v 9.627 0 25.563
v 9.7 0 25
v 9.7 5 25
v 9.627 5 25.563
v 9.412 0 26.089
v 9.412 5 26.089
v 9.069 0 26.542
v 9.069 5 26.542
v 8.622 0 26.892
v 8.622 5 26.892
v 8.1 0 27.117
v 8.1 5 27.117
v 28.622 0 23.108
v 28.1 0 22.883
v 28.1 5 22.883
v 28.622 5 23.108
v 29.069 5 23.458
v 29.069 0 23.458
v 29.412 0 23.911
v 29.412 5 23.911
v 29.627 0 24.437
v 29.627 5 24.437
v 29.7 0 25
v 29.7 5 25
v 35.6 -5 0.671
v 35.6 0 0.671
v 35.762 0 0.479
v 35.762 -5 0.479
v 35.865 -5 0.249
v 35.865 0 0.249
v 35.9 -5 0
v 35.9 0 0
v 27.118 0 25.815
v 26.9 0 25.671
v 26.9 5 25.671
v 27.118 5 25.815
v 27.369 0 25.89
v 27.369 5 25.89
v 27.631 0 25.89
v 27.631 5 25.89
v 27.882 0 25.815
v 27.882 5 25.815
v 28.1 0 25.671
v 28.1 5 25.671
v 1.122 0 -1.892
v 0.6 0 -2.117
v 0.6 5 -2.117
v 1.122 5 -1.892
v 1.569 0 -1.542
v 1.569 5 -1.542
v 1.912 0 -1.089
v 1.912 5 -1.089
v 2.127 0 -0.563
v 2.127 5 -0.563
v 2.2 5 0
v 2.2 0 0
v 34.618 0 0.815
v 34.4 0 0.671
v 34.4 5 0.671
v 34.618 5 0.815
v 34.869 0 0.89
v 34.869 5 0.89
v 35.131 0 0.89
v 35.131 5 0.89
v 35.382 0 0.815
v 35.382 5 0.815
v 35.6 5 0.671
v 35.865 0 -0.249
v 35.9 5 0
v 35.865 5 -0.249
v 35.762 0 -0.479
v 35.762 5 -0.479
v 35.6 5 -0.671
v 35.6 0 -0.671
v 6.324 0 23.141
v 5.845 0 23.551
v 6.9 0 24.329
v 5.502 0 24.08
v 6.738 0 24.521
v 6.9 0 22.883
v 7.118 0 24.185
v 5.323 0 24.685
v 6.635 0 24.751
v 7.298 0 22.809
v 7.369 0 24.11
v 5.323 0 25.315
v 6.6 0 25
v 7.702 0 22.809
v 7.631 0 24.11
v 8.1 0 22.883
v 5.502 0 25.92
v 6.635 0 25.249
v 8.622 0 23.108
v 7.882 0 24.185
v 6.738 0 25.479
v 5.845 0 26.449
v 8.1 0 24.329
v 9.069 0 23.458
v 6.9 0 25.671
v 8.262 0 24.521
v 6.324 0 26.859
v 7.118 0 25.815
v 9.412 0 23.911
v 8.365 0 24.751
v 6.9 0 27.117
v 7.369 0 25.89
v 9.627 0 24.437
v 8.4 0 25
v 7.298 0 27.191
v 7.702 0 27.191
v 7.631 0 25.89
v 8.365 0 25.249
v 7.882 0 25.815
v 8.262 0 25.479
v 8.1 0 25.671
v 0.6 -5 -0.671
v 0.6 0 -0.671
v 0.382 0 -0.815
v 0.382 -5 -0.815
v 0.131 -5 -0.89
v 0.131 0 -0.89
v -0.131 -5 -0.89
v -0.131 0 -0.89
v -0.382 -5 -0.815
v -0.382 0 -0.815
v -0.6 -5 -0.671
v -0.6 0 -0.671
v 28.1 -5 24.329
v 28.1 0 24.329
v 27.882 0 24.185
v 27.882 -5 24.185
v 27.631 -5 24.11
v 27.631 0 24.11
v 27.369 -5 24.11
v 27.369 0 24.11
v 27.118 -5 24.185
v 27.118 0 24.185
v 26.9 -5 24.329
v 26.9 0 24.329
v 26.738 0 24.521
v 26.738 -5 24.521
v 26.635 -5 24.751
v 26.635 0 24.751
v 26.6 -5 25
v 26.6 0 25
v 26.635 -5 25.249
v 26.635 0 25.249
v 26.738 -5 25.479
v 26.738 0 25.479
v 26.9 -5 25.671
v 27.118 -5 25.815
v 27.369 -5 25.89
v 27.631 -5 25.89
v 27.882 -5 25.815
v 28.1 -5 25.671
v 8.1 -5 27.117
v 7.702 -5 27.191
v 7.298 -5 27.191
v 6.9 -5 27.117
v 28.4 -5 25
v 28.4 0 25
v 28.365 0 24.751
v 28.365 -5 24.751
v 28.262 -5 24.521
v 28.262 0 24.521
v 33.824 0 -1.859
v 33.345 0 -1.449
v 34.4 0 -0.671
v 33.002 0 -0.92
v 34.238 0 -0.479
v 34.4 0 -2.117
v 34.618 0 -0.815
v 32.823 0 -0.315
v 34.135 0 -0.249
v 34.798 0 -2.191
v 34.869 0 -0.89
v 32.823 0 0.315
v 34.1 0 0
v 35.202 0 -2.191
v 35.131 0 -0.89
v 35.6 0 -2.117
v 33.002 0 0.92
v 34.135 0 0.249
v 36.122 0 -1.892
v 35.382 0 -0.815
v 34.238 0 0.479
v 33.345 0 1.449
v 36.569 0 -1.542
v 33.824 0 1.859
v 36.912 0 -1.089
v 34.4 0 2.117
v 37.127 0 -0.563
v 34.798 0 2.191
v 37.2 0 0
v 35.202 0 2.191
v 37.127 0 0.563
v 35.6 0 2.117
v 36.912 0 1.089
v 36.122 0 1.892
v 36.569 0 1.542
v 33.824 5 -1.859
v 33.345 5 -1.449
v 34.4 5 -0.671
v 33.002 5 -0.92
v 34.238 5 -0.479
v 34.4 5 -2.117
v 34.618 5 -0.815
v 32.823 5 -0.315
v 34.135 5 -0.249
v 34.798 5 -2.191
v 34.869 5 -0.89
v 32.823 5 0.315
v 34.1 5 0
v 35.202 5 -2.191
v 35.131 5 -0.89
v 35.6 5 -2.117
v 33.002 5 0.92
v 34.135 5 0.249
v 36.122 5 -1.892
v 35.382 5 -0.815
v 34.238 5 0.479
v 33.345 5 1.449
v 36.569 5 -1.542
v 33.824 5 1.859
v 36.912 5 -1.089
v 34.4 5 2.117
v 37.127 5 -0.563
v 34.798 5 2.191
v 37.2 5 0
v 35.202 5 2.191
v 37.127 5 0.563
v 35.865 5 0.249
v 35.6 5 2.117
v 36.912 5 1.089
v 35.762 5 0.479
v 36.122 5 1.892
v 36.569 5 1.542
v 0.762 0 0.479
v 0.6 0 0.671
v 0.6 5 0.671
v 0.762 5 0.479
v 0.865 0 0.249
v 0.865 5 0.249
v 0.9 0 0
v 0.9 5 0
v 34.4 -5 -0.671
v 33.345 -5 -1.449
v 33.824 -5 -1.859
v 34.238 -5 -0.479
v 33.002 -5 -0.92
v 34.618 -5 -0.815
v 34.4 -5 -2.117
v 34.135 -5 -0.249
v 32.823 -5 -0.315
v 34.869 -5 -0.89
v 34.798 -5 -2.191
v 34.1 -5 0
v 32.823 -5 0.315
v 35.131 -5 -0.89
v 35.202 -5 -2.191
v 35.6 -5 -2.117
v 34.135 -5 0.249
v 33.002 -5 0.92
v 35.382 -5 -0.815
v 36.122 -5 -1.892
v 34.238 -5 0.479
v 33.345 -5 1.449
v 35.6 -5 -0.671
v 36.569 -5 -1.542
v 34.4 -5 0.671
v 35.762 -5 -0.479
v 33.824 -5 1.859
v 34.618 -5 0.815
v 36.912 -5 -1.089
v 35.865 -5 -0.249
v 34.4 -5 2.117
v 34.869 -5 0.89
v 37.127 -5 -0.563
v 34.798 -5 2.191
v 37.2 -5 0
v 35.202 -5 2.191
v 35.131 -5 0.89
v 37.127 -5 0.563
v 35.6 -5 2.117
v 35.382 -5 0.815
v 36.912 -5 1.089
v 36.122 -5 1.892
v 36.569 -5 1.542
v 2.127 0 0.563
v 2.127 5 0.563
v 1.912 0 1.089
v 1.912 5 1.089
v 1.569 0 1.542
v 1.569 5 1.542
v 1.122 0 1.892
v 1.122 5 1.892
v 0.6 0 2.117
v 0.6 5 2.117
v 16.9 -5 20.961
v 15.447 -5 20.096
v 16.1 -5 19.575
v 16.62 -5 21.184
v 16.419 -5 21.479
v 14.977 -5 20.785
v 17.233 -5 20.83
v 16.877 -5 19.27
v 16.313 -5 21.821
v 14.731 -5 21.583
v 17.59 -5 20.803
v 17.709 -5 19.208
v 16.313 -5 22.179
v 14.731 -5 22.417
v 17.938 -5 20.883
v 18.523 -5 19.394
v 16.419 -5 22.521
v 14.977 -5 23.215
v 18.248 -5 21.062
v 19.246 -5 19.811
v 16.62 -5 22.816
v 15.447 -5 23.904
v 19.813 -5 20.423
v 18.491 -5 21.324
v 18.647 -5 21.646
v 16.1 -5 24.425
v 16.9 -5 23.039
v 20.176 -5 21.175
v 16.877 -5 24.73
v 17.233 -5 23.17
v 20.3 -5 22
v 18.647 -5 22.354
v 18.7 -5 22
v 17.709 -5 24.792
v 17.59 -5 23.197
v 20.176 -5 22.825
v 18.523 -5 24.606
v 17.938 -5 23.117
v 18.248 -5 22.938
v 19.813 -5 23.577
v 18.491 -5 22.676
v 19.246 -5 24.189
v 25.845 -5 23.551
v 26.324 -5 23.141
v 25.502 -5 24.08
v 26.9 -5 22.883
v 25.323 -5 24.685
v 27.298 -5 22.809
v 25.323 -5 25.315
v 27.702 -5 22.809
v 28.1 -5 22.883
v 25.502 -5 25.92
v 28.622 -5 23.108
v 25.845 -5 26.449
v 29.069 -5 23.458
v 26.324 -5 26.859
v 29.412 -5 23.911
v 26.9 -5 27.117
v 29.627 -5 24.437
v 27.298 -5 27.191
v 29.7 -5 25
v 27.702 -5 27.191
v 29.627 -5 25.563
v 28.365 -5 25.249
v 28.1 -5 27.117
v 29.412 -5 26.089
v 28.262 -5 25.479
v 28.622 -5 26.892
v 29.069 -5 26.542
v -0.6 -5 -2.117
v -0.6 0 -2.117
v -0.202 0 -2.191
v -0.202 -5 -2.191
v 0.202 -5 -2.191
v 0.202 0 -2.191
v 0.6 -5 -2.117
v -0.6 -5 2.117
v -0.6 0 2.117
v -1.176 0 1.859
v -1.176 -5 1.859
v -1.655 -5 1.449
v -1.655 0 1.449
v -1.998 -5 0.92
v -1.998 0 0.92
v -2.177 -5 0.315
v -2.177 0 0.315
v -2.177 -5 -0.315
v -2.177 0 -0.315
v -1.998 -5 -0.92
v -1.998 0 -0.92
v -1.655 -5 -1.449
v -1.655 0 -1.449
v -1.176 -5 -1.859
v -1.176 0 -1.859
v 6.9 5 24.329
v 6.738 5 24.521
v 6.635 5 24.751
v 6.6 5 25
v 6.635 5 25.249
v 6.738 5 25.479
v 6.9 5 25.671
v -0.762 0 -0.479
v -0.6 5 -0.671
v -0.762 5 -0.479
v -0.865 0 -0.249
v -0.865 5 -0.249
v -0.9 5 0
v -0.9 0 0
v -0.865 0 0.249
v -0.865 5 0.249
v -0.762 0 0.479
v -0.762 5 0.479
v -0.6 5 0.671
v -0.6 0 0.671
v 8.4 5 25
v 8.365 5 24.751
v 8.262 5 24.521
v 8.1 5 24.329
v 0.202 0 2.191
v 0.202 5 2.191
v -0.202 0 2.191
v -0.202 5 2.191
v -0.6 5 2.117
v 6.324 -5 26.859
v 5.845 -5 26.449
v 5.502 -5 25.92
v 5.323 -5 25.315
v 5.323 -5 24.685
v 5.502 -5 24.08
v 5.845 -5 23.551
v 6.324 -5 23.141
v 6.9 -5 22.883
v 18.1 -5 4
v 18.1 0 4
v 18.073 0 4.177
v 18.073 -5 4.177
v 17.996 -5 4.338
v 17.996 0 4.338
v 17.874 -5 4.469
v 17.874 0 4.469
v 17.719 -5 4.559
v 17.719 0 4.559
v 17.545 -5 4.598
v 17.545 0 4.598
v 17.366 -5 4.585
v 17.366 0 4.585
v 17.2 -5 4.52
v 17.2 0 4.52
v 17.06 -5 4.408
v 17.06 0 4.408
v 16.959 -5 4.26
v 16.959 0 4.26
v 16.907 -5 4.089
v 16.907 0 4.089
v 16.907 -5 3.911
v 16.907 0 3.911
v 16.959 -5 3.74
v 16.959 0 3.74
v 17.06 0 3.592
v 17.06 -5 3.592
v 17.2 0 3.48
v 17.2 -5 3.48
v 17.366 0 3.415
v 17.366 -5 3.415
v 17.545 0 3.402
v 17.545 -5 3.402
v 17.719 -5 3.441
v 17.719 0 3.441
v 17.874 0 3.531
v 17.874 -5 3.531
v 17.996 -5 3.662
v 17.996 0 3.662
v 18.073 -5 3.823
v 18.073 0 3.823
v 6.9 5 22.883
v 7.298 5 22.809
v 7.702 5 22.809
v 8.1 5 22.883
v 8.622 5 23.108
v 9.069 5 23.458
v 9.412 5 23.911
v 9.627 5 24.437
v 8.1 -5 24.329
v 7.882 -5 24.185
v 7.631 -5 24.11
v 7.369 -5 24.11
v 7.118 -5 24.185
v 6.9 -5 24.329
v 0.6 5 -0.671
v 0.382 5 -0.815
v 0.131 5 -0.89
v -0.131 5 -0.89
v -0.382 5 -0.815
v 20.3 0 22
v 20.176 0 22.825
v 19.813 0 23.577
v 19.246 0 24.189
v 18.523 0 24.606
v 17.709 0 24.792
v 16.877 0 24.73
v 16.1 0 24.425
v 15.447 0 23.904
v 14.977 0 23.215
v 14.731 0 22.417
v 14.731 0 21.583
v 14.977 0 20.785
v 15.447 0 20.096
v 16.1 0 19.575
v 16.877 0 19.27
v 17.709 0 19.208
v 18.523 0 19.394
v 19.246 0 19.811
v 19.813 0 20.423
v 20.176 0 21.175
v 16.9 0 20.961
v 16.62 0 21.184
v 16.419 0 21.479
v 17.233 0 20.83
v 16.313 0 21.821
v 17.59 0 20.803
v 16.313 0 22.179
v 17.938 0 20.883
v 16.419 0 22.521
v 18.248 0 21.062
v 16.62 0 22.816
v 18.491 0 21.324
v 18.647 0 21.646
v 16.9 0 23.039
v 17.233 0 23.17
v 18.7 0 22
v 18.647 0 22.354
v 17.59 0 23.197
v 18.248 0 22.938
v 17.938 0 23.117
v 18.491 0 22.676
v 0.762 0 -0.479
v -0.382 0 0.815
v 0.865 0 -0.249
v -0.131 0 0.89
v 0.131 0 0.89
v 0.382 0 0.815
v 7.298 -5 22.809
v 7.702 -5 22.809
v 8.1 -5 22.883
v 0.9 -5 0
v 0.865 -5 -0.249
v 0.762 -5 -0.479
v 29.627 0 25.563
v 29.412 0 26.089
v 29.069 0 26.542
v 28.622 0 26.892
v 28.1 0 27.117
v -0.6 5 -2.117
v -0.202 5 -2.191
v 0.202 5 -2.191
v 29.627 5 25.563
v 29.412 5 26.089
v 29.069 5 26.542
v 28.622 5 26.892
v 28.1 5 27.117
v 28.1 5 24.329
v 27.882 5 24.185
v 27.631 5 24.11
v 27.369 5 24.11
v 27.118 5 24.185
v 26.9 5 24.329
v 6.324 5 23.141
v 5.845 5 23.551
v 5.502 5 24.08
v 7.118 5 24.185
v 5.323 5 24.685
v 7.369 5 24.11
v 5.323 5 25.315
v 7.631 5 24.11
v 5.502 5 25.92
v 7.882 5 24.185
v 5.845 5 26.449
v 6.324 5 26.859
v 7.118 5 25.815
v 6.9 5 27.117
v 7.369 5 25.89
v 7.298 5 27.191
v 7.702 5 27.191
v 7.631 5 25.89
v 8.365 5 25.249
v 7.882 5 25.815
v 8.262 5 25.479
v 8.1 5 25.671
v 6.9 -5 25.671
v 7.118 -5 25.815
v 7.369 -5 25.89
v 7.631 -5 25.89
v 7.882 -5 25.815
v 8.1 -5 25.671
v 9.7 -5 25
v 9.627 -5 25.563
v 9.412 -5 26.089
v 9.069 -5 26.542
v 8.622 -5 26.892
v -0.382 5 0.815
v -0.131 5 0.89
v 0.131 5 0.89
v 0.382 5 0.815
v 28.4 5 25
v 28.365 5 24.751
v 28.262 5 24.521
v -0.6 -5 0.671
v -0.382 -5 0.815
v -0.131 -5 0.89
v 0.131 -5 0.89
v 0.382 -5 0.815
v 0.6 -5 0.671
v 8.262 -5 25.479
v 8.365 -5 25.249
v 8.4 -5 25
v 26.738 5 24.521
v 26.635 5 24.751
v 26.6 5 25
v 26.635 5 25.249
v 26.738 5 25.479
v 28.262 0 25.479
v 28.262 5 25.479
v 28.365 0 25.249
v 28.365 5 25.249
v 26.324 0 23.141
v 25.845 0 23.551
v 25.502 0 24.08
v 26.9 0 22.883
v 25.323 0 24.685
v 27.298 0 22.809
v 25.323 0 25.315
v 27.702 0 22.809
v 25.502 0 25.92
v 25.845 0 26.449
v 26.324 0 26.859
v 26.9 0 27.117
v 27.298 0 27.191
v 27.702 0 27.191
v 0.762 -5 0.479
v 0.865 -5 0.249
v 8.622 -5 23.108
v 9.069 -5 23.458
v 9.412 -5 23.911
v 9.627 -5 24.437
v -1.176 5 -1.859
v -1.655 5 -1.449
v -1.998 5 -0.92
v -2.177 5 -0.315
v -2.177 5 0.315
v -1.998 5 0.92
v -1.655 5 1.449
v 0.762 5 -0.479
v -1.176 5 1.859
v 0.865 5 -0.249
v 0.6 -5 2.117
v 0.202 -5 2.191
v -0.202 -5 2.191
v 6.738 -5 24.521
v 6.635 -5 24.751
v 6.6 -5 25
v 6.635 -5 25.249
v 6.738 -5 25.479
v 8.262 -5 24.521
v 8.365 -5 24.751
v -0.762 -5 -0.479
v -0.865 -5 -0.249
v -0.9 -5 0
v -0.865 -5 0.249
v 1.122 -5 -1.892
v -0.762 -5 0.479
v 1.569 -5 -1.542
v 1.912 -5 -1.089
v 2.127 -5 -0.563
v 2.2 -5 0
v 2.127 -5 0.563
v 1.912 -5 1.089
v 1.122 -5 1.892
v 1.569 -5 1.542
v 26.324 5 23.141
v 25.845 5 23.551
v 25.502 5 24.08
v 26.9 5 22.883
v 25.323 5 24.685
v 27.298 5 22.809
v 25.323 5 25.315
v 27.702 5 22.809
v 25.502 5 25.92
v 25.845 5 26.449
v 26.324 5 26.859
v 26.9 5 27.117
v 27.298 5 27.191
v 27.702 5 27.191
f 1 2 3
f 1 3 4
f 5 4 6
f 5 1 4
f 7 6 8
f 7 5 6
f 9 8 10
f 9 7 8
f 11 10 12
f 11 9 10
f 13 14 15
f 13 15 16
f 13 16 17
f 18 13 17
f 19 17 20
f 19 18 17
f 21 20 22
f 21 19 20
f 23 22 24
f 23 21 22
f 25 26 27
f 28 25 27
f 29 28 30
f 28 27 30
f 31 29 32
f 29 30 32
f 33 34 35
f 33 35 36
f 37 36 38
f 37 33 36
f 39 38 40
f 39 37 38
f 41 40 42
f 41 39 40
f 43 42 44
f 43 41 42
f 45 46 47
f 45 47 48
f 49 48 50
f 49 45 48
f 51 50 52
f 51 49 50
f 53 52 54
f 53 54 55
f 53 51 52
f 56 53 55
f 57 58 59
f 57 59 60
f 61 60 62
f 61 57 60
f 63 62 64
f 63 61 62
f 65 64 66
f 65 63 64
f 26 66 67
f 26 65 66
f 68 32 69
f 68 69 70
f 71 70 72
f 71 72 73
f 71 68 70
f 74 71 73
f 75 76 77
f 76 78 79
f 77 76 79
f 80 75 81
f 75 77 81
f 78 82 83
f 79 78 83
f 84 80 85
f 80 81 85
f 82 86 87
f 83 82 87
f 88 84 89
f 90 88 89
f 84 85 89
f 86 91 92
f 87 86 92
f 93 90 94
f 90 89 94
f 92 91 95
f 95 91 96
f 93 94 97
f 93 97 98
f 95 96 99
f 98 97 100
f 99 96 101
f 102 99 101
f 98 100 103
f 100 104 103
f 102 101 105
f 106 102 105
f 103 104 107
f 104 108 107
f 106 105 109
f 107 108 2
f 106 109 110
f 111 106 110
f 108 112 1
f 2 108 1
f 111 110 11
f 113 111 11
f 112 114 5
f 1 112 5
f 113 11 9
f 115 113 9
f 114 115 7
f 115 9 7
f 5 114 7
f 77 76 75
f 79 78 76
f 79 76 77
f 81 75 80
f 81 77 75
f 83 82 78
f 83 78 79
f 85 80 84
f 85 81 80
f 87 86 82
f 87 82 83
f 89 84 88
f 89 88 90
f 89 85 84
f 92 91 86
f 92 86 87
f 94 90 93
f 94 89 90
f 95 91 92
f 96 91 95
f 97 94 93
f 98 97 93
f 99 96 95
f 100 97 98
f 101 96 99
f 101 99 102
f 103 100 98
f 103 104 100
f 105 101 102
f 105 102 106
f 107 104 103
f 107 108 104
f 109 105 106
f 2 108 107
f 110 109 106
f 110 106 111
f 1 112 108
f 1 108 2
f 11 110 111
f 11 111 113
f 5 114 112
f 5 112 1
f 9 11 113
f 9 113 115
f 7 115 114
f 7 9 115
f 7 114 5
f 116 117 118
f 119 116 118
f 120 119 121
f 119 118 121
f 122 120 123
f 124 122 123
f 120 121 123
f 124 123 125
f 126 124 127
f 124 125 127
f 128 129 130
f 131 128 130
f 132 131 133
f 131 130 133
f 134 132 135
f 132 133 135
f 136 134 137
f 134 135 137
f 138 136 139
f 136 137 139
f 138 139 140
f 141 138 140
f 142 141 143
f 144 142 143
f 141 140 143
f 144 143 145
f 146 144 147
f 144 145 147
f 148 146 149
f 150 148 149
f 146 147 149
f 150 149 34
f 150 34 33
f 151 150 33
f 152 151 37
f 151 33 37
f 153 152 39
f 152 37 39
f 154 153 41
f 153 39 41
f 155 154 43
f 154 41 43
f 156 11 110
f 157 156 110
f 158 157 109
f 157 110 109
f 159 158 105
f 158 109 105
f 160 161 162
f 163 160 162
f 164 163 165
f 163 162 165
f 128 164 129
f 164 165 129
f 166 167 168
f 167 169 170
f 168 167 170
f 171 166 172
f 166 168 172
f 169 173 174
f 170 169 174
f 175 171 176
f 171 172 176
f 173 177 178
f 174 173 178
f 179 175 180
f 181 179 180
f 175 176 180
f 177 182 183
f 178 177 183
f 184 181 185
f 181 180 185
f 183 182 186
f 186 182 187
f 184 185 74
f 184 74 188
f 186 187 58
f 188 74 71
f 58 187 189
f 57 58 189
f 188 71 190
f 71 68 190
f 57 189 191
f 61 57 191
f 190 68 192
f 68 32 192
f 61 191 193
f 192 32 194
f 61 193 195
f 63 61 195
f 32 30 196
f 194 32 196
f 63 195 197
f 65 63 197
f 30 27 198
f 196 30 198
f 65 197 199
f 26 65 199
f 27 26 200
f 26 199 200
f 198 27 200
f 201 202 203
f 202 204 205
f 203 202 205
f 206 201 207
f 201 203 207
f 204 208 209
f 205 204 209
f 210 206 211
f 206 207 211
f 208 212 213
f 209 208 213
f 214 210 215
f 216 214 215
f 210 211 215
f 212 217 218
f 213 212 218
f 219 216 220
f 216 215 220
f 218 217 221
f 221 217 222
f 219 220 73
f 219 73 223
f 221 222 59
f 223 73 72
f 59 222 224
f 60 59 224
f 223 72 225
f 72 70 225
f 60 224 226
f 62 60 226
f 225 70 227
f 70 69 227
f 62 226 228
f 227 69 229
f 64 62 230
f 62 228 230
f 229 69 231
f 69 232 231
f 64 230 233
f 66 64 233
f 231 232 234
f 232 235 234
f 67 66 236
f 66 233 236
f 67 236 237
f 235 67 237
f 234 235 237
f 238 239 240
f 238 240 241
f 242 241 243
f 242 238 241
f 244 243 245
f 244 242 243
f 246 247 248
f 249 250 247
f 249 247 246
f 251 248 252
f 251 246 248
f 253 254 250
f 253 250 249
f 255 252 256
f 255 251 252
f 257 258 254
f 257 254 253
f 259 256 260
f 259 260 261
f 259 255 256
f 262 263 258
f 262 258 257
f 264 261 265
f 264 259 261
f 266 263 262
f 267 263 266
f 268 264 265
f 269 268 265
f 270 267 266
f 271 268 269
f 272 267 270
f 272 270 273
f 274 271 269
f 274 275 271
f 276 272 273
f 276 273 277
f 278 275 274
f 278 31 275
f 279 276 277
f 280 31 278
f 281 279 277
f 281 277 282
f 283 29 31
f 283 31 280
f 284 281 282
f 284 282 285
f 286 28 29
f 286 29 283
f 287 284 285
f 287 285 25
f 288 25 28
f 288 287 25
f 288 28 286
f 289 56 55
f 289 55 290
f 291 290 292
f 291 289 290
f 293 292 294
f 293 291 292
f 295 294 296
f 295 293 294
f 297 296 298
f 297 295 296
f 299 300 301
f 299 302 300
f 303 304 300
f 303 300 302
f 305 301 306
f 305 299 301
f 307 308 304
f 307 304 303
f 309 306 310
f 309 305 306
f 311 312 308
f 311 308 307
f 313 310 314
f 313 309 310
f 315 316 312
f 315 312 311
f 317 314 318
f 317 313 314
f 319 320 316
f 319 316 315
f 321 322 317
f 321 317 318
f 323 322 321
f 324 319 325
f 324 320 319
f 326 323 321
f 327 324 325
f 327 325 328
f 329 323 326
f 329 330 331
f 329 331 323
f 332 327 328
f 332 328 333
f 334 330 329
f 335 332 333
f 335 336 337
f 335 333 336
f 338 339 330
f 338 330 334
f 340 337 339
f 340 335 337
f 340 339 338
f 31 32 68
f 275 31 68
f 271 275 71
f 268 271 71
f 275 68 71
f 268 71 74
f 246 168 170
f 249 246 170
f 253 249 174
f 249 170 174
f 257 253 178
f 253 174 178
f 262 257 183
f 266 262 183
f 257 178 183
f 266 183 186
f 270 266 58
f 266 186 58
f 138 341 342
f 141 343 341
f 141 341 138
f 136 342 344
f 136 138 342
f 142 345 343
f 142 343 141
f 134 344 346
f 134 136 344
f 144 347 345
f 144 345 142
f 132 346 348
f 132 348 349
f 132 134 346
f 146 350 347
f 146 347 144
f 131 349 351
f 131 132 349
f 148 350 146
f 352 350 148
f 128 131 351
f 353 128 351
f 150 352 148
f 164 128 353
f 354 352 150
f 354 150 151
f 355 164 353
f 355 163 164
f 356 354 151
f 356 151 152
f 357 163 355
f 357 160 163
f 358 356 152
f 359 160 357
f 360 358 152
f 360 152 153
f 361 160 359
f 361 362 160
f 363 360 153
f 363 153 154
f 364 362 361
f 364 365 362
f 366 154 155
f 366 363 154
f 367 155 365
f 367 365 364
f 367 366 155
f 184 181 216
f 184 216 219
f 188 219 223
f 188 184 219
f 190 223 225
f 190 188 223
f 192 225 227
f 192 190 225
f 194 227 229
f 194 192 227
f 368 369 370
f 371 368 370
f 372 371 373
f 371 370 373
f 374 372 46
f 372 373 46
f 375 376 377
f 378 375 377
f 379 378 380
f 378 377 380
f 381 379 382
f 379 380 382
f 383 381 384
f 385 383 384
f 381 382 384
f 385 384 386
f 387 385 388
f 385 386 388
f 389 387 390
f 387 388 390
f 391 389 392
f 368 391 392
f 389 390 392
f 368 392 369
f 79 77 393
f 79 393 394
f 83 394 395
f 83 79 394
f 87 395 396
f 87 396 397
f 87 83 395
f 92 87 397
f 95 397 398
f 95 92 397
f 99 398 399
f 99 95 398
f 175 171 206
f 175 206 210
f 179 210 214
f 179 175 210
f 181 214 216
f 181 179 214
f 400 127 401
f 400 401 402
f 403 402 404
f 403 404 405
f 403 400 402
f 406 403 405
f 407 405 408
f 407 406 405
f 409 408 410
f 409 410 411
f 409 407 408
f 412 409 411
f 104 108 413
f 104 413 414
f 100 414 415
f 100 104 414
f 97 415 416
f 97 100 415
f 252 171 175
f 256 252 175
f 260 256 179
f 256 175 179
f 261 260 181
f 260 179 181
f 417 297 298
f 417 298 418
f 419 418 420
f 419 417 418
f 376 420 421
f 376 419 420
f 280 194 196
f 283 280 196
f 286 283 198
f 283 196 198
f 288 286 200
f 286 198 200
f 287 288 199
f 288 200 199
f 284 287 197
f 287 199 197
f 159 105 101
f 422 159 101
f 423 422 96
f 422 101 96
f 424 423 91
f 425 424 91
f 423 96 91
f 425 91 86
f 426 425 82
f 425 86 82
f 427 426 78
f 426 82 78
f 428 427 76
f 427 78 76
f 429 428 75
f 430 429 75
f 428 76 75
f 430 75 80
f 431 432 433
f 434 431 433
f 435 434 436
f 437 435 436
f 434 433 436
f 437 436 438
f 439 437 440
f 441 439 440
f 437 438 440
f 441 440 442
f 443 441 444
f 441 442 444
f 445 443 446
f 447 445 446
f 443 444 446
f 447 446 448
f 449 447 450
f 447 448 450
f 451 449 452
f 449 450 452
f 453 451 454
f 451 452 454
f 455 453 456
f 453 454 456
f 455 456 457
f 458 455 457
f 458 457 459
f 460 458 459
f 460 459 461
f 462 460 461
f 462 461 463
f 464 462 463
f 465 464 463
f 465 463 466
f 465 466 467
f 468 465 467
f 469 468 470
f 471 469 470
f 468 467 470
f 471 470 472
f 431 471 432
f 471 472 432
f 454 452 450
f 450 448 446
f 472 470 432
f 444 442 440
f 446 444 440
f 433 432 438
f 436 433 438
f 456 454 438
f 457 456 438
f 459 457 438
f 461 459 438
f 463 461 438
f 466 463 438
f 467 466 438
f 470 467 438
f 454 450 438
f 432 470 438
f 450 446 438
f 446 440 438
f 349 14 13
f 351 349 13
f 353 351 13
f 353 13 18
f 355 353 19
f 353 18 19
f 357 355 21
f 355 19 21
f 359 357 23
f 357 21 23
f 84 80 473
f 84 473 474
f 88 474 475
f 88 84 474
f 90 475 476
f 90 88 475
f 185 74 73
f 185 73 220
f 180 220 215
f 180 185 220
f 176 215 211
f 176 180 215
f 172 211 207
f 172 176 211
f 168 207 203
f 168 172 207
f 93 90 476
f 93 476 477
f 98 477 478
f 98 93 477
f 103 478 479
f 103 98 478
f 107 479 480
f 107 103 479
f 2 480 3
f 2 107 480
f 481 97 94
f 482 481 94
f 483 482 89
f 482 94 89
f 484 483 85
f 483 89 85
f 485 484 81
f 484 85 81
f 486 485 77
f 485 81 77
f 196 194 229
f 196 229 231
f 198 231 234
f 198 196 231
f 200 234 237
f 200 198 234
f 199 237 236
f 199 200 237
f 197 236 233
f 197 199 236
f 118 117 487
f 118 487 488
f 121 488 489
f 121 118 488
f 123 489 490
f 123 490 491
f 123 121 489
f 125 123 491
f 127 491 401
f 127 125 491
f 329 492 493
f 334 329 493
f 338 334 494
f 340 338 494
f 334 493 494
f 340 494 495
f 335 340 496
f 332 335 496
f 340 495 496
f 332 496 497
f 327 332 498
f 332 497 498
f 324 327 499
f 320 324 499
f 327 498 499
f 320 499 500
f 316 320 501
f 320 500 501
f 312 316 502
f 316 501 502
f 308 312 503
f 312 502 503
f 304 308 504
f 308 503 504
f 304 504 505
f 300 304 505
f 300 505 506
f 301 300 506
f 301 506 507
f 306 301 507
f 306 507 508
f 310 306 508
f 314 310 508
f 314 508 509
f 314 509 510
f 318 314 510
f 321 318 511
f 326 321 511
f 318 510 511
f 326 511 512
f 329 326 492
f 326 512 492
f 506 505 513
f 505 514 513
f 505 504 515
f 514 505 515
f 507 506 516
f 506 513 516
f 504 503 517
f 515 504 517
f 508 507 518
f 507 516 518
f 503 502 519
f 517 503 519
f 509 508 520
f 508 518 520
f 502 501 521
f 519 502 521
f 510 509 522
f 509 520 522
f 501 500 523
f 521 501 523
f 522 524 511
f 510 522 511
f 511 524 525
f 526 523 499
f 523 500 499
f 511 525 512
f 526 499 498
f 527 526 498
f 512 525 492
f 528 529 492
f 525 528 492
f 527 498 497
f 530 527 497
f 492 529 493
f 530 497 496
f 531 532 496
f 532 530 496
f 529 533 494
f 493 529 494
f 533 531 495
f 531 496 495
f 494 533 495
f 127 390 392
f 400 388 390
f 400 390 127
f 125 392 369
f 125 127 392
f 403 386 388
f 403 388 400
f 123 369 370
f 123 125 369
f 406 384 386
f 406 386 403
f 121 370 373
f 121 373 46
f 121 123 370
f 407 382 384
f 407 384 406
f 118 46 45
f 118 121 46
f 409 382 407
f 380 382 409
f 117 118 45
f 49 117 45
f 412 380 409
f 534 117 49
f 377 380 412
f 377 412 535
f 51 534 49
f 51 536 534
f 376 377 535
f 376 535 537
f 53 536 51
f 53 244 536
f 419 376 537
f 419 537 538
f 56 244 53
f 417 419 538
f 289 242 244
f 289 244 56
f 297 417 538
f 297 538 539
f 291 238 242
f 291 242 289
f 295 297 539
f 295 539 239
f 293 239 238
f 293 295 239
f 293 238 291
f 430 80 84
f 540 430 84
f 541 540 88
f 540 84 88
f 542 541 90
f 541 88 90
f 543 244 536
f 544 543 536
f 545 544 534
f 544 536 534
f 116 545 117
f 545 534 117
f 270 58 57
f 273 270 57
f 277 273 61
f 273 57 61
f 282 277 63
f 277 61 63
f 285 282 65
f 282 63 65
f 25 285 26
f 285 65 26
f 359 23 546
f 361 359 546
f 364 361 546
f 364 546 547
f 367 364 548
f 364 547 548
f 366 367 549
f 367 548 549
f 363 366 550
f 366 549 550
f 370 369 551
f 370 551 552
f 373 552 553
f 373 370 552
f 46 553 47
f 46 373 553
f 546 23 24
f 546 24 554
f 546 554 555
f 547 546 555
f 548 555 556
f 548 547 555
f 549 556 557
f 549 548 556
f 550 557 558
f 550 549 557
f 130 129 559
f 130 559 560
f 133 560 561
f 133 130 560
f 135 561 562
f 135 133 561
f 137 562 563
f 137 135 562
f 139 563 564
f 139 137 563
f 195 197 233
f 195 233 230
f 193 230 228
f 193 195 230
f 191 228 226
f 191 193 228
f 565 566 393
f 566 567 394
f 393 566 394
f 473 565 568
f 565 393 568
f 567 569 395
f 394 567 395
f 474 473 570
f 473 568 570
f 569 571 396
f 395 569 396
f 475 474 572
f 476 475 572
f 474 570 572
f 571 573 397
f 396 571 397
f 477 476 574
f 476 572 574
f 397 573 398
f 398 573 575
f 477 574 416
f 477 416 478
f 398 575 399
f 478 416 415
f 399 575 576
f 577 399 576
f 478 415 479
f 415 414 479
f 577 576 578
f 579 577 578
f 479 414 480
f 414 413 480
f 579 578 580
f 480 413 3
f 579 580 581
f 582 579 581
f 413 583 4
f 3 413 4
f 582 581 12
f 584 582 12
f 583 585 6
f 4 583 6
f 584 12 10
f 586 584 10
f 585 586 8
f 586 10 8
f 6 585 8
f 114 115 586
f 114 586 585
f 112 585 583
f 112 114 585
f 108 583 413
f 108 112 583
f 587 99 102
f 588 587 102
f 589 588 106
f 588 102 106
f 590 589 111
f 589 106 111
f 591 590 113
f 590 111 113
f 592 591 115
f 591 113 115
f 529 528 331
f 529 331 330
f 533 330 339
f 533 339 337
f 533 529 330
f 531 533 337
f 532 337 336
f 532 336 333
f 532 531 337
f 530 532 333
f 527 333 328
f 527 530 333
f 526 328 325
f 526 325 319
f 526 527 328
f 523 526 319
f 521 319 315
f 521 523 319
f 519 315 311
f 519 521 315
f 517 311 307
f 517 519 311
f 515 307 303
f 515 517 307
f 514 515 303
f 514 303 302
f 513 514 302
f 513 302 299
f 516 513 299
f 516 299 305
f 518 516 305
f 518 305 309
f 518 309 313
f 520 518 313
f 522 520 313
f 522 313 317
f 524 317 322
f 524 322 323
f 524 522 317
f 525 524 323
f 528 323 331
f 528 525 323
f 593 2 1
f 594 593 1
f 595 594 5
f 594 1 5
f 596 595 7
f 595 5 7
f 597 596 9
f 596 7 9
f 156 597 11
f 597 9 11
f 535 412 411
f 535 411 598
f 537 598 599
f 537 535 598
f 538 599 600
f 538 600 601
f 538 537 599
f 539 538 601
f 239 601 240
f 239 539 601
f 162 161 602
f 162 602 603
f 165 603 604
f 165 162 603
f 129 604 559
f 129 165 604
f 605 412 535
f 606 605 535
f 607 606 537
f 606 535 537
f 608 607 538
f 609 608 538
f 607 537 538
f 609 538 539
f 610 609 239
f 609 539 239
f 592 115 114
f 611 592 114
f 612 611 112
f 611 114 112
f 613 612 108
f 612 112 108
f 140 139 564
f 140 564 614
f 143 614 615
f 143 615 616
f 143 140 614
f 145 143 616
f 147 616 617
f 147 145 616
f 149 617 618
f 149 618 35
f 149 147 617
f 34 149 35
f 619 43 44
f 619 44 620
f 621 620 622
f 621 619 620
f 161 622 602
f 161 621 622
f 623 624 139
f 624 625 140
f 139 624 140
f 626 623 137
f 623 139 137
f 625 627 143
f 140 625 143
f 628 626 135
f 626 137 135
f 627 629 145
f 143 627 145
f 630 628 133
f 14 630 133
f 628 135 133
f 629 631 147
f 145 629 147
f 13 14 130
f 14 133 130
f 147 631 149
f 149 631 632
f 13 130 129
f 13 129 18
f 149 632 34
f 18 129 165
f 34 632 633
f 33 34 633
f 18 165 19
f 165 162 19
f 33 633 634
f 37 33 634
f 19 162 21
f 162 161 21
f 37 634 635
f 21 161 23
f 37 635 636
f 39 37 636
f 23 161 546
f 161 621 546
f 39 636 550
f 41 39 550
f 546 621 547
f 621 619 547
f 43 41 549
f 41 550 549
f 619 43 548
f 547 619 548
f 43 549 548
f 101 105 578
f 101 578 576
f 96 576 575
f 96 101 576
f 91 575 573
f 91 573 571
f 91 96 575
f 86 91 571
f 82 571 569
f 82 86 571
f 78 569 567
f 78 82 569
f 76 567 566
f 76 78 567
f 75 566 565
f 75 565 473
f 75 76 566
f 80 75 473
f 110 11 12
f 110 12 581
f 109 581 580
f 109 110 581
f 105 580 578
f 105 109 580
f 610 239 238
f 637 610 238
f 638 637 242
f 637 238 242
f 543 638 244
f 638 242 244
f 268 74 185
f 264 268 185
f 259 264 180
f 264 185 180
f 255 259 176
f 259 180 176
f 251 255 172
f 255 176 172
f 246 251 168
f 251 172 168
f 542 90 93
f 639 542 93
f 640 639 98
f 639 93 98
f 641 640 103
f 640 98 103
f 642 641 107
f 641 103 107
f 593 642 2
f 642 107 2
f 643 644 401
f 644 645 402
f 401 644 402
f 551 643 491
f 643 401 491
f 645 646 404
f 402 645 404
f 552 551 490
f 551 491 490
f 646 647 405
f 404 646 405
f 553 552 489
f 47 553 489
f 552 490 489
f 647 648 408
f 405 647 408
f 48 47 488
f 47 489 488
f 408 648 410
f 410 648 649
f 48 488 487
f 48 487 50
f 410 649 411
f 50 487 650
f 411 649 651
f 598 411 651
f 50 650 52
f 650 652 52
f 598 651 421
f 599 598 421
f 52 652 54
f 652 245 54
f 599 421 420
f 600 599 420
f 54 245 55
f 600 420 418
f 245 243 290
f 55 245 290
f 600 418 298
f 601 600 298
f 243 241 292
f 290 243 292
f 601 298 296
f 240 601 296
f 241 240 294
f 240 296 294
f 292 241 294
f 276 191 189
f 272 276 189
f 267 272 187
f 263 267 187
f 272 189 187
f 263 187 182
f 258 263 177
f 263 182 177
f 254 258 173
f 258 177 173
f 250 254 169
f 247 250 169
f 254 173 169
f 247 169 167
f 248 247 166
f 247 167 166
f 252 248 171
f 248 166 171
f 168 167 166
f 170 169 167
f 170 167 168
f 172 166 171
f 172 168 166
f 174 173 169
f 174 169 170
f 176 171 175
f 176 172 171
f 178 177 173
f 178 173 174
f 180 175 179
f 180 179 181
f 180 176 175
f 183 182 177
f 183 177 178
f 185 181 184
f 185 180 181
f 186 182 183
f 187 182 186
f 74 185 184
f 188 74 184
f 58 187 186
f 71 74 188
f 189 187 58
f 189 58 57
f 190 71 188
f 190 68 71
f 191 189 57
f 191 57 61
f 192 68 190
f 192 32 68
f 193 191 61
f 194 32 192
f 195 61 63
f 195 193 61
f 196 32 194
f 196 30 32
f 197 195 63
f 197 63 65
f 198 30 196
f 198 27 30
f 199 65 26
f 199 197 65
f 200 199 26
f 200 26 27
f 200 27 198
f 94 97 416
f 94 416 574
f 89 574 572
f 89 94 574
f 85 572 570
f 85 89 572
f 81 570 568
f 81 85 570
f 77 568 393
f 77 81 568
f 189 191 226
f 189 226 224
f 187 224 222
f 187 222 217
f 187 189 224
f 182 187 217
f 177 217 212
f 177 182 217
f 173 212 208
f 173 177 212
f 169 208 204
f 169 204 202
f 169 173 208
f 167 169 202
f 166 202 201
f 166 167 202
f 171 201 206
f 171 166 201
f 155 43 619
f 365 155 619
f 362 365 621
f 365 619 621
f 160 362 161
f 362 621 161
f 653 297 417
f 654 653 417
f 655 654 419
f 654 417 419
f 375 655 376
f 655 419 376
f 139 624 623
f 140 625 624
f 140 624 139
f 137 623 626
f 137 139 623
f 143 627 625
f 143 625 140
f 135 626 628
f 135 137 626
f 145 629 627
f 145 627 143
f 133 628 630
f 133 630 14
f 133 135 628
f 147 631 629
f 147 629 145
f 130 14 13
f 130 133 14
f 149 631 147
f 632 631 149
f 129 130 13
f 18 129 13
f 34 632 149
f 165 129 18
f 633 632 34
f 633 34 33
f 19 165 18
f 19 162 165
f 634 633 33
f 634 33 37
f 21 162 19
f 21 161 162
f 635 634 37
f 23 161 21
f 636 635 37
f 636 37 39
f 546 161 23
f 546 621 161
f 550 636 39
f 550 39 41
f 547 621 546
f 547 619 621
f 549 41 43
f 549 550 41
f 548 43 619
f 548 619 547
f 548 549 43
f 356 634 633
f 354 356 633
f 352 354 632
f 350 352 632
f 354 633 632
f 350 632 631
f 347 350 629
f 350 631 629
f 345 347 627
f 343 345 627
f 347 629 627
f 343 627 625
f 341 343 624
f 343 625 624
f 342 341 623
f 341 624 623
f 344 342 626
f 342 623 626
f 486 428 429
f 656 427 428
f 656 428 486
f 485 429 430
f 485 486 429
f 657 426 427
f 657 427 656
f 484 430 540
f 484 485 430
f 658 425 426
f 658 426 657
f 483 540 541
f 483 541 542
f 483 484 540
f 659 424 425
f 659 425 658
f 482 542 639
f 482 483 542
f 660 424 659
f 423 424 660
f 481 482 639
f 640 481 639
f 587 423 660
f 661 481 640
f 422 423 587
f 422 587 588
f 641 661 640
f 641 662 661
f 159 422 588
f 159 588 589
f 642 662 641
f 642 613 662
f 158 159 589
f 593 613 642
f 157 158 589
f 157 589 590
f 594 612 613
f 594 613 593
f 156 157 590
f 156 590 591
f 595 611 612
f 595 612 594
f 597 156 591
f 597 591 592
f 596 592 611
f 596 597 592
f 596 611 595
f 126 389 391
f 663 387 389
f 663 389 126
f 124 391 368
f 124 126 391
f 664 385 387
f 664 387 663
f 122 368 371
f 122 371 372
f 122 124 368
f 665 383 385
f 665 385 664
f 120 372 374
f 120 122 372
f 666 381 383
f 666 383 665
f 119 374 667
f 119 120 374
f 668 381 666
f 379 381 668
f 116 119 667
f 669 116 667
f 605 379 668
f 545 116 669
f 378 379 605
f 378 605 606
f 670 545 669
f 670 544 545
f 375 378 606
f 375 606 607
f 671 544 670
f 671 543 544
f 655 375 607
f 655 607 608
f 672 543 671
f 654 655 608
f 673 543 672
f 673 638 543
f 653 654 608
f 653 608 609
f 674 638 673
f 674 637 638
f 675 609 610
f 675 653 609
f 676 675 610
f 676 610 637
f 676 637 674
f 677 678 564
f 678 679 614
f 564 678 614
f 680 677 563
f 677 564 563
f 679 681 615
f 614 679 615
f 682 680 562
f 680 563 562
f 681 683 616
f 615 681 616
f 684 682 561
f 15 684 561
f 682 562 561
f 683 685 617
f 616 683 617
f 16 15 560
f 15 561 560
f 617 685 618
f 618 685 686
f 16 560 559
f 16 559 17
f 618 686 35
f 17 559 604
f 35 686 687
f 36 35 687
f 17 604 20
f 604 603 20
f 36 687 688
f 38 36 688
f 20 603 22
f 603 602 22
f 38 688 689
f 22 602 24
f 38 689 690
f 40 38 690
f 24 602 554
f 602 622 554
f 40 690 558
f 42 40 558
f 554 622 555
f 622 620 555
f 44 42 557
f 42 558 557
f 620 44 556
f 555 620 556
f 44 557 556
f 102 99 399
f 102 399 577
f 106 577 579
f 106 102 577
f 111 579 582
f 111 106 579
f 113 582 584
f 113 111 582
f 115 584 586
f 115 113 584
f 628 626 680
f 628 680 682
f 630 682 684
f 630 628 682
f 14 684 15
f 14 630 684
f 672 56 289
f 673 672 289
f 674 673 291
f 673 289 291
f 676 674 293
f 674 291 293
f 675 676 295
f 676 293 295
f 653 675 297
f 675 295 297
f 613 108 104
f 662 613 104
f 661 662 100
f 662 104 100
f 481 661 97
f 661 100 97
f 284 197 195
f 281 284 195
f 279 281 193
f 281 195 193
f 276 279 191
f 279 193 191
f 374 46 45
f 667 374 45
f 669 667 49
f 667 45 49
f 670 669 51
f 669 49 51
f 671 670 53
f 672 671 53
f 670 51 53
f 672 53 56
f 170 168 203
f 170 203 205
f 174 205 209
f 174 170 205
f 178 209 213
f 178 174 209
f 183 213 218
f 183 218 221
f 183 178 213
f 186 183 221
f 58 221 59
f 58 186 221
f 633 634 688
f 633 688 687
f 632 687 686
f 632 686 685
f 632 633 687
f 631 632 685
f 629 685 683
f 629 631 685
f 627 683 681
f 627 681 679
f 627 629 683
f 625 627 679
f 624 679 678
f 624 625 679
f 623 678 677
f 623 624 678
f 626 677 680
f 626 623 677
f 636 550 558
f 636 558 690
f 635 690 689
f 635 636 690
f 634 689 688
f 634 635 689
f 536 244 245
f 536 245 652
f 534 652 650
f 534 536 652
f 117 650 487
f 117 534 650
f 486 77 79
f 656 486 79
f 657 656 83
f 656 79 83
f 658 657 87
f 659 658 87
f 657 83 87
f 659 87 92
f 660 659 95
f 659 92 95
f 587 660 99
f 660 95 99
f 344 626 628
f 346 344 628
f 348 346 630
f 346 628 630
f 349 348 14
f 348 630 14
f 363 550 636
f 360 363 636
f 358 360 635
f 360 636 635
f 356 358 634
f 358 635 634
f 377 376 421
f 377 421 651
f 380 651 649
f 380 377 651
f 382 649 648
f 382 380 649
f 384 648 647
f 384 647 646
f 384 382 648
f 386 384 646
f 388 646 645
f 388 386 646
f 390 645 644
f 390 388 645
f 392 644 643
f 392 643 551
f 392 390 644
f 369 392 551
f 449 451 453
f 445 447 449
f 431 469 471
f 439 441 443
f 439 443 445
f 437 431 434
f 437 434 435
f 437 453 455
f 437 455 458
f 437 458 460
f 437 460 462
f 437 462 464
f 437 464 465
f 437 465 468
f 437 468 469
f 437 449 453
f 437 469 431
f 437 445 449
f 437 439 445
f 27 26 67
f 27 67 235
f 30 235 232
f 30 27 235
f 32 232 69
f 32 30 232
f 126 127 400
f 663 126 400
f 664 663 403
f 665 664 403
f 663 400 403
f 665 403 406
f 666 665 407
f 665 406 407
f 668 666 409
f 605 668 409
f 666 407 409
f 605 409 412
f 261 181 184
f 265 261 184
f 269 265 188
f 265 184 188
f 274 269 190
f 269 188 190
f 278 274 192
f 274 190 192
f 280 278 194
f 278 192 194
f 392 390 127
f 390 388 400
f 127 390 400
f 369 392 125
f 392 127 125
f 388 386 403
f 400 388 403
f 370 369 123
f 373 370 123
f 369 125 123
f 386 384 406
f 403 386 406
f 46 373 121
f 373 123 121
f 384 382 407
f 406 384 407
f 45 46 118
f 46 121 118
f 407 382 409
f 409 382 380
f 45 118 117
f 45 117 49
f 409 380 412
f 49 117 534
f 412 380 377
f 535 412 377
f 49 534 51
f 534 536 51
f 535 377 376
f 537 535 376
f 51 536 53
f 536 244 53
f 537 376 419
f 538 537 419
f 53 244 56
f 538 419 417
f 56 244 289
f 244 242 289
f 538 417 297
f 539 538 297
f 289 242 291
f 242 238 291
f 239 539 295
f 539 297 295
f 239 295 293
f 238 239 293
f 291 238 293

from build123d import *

# Parameters (mm, degrees)
F1_DEPTH = 5
F2_DEPTH = 5
F0_R     = 2.8
F0_R_2   = 1.2
F0_R_3   = 0.6


with BuildPart() as f1:
    # F0 (on Front) → F1 (new body)
    with BuildSketch(Plane.XZ):
        with BuildLine():
            ThreePointArc((26.9, 24.3291796068), (26.6, 25), (26.9, 25.6708203932))
            Line((26.9, 25.6708203932), (26.9, 27.1166010489))
            ThreePointArc((26.9, 27.1166010489), (25.3, 25), (26.9, 22.8833989511))
            Line((26.9, 22.8833989511), (26.9, 24.3291796068))
        make_face()
        with BuildLine():
            ThreePointArc((26.9, 25.6708203932), (27.5, 25.9), (28.1, 25.6708203932))
            Line((28.1, 25.6708203932), (28.1, 27.1166010489))
            ThreePointArc((28.1, 27.1166010489), (27.5, 27.2), (26.9, 27.1166010489))
            Line((26.9, 27.1166010489), (26.9, 25.6708203932))
        make_face()
        with BuildLine():
            ThreePointArc((28.1, 25.6708203932), (28.3215838363, 25.3674234614), (28.4, 25))
            ThreePointArc((28.4, 25), (28.3215838363, 24.6325765386), (28.1, 24.3291796068))
            Line((28.1, 24.3291796068), (28.1, 22.8833989511))
            ThreePointArc((28.1, 22.8833989511), (29.2549928775, 23.6733500839), (29.7, 25))
            ThreePointArc((29.7, 25), (29.2549928775, 26.3266499161), (28.1, 27.1166010489))
            Line((28.1, 27.1166010489), (28.1, 25.6708203932))
        make_face()
        with BuildLine():
            Line((28.1, 22.8833989511), (28.1, 24.3291796068))
            ThreePointArc((28.1, 24.3291796068), (27.5, 24.1), (26.9, 24.3291796068))
            Line((26.9, 24.3291796068), (26.9, 22.8833989511))
            ThreePointArc((26.9, 22.8833989511), (27.5, 22.8), (28.1, 22.8833989511))
        make_face()
    extrude(amount=-F1_DEPTH)


with BuildPart() as f1b:
    # F0 (on Front) → F1, piece 2 (new body)
    with BuildSketch(Plane.XZ):
        with BuildLine():
            ThreePointArc((8.1, 25.6708203932), (8.3215838363, 25.3674234614), (8.4, 25))
            ThreePointArc((8.4, 25), (8.3215838363, 24.6325765386), (8.1, 24.3291796068))
            Line((8.1, 24.3291796068), (8.1, 22.8833989511))
            ThreePointArc((8.1, 22.8833989511), (9.2549928775, 23.6733500839), (9.7, 25))
            ThreePointArc((9.7, 25), (9.2549928775, 26.3266499161), (8.1, 27.1166010489))
            Line((8.1, 27.1166010489), (8.1, 25.6708203932))
        make_face()
        with BuildLine():
            ThreePointArc((6.9, 25.6708203932), (7.5, 25.9), (8.1, 25.6708203932))
            Line((8.1, 25.6708203932), (8.1, 27.1166010489))
            ThreePointArc((8.1, 27.1166010489), (7.5, 27.2), (6.9, 27.1166010489))
            Line((6.9, 27.1166010489), (6.9, 25.6708203932))
        make_face()
        with BuildLine():
            ThreePointArc((6.9, 24.3291796068), (6.6, 25), (6.9, 25.6708203932))
            Line((6.9, 25.6708203932), (6.9, 27.1166010489))
            ThreePointArc((6.9, 27.1166010489), (5.3, 25), (6.9, 22.8833989511))
            Line((6.9, 22.8833989511), (6.9, 24.3291796068))
        make_face()
        with BuildLine():
            Line((8.1, 22.8833989511), (8.1, 24.3291796068))
            ThreePointArc((8.1, 24.3291796068), (7.5, 24.1), (6.9, 24.3291796068))
            Line((6.9, 24.3291796068), (6.9, 22.8833989511))
            ThreePointArc((6.9, 22.8833989511), (7.5, 22.8), (8.1, 22.8833989511))
        make_face()
    extrude(amount=-F1_DEPTH)


with BuildPart() as f1c:
    # F0 (on Front) → F1, piece 3 (new body)
    with BuildSketch(Plane.XZ):
        with BuildLine():
            ThreePointArc((34.4, -0.6708203932), (34.1, 0), (34.4, 0.6708203932))
            Line((34.4, 0.6708203932), (34.4, 2.1166010489))
            ThreePointArc((34.4, 2.1166010489), (32.8, 0), (34.4, -2.1166010489))
            Line((34.4, -2.1166010489), (34.4, -0.6708203932))
        make_face()
        with BuildLine():
            Line((35.6, -2.1166010489), (35.6, -0.6708203932))
            ThreePointArc((35.6, -0.6708203932), (35, -0.9), (34.4, -0.6708203932))
            Line((34.4, -0.6708203932), (34.4, -2.1166010489))
            ThreePointArc((34.4, -2.1166010489), (35, -2.2), (35.6, -2.1166010489))
        make_face()
        with BuildLine():
            ThreePointArc((35.6, 0.6708203932), (35.8215838363, 0.3674234614), (35.9, 0))
            ThreePointArc((35.9, 0), (35.8215838363, -0.3674234614), (35.6, -0.6708203932))
            Line((35.6, -0.6708203932), (35.6, -2.1166010489))
            ThreePointArc((35.6, -2.1166010489), (36.7549928775, -1.3266499161), (37.2, 0))
            ThreePointArc((37.2, 0), (36.7549928775, 1.3266499161), (35.6, 2.1166010489))
            Line((35.6, 2.1166010489), (35.6, 0.6708203932))
        make_face()
        with BuildLine():
            ThreePointArc((34.4, 0.6708203932), (35, 0.9), (35.6, 0.6708203932))
            Line((35.6, 0.6708203932), (35.6, 2.1166010489))
            ThreePointArc((35.6, 2.1166010489), (35, 2.2), (34.4, 2.1166010489))
            Line((34.4, 2.1166010489), (34.4, 0.6708203932))
        make_face()
    extrude(amount=-F1_DEPTH)


with BuildPart() as f1d:
    # F0 (on Front) → F1, piece 4 (new body)
    with BuildSketch(Plane.XZ):
        with BuildLine():
            ThreePointArc((0.6, 0.6708203932), (0.8215838363, 0.3674234614), (0.9, 0))
            ThreePointArc((0.9, 0), (0.8215838363, -0.3674234614), (0.6, -0.6708203932))
            Line((0.6, -0.6708203932), (0.6, -2.1166010489))
            ThreePointArc((0.6, -2.1166010489), (1.7549928775, -1.3266499161), (2.2, 0))
            ThreePointArc((2.2, 0), (1.7549928775, 1.3266499161), (0.6, 2.1166010489))
            Line((0.6, 2.1166010489), (0.6, 0.6708203932))
        make_face()
        with BuildLine():
            ThreePointArc((-0.6, 0.6708203932), (0, 0.9), (0.6, 0.6708203932))
            Line((0.6, 0.6708203932), (0.6, 2.1166010489))
            ThreePointArc((0.6, 2.1166010489), (0, 2.2), (-0.6, 2.1166010489))
            Line((-0.6, 2.1166010489), (-0.6, 0.6708203932))
        make_face()
        with BuildLine():
            ThreePointArc((-0.6, -0.6708203932), (-0.9, 0), (-0.6, 0.6708203932))
            Line((-0.6, 0.6708203932), (-0.6, 2.1166010489))
            ThreePointArc((-0.6, 2.1166010489), (-2.2, 0), (-0.6, -2.1166010489))
            Line((-0.6, -2.1166010489), (-0.6, -0.6708203932))
        make_face()
        with BuildLine():
            Line((0.6, -2.1166010489), (0.6, -0.6708203932))
            ThreePointArc((0.6, -0.6708203932), (0, -0.9), (-0.6, -0.6708203932))
            Line((-0.6, -0.6708203932), (-0.6, -2.1166010489))
            ThreePointArc((-0.6, -2.1166010489), (0, -2.2), (0.6, -2.1166010489))
        make_face()
    extrude(amount=-F1_DEPTH)


with BuildPart() as f2:
    # F0 (on Front) → F2 (new body)
    with BuildSketch(Plane.XZ):
        with BuildLine():
            ThreePointArc((-0.6, -0.6708203932), (-0.9, 0), (-0.6, 0.6708203932))
            Line((-0.6, 0.6708203932), (-0.6, 2.1166010489))
            ThreePointArc((-0.6, 2.1166010489), (-2.2, 0), (-0.6, -2.1166010489))
            Line((-0.6, -2.1166010489), (-0.6, -0.6708203932))
        make_face()
        with BuildLine():
            ThreePointArc((0.6, 0.6708203932), (0.8215838363, 0.3674234614), (0.9, 0))
            ThreePointArc((0.9, 0), (0.8215838363, -0.3674234614), (0.6, -0.6708203932))
            Line((0.6, -0.6708203932), (0.6, -2.1166010489))
            ThreePointArc((0.6, -2.1166010489), (1.7549928775, -1.3266499161), (2.2, 0))
            ThreePointArc((2.2, 0), (1.7549928775, 1.3266499161), (0.6, 2.1166010489))
            Line((0.6, 2.1166010489), (0.6, 0.6708203932))
        make_face()
        with BuildLine():
            ThreePointArc((-0.6, 0.6708203932), (0, 0.9), (0.6, 0.6708203932))
            Line((0.6, 0.6708203932), (0.6, 2.1166010489))
            ThreePointArc((0.6, 2.1166010489), (0, 2.2), (-0.6, 2.1166010489))
            Line((-0.6, 2.1166010489), (-0.6, 0.6708203932))
        make_face()
        with BuildLine():
            Line((0.6, -2.1166010489), (0.6, -0.6708203932))
            ThreePointArc((0.6, -0.6708203932), (0, -0.9), (-0.6, -0.6708203932))
            Line((-0.6, -0.6708203932), (-0.6, -2.1166010489))
            ThreePointArc((-0.6, -2.1166010489), (0, -2.2), (0.6, -2.1166010489))
        make_face()
    extrude(amount=F2_DEPTH)


with BuildPart() as f2b:
    # F0 (on Front) → F2, piece 2 (new body)
    with BuildSketch(Plane.XZ):
        with BuildLine():
            ThreePointArc((35.6, 0.6708203932), (35.8215838363, 0.3674234614), (35.9, 0))
            ThreePointArc((35.9, 0), (35.8215838363, -0.3674234614), (35.6, -0.6708203932))
            Line((35.6, -0.6708203932), (35.6, -2.1166010489))
            ThreePointArc((35.6, -2.1166010489), (36.7549928775, -1.3266499161), (37.2, 0))
            ThreePointArc((37.2, 0), (36.7549928775, 1.3266499161), (35.6, 2.1166010489))
            Line((35.6, 2.1166010489), (35.6, 0.6708203932))
        make_face()
        with BuildLine():
            ThreePointArc((34.4, 0.6708203932), (35, 0.9), (35.6, 0.6708203932))
            Line((35.6, 0.6708203932), (35.6, 2.1166010489))
            ThreePointArc((35.6, 2.1166010489), (35, 2.2), (34.4, 2.1166010489))
            Line((34.4, 2.1166010489), (34.4, 0.6708203932))
        make_face()
        with BuildLine():
            ThreePointArc((34.4, -0.6708203932), (34.1, 0), (34.4, 0.6708203932))
            Line((34.4, 0.6708203932), (34.4, 2.1166010489))
            ThreePointArc((34.4, 2.1166010489), (32.8, 0), (34.4, -2.1166010489))
            Line((34.4, -2.1166010489), (34.4, -0.6708203932))
        make_face()
        with BuildLine():
            Line((35.6, -2.1166010489), (35.6, -0.6708203932))
            ThreePointArc((35.6, -0.6708203932), (35, -0.9), (34.4, -0.6708203932))
            Line((34.4, -0.6708203932), (34.4, -2.1166010489))
            ThreePointArc((34.4, -2.1166010489), (35, -2.2), (35.6, -2.1166010489))
        make_face()
    extrude(amount=F2_DEPTH)


with BuildPart() as f2c:
    # F0 (on Front) → F2, piece 3 (new body)
    with BuildSketch(Plane.XZ):
        with BuildLine():
            ThreePointArc((26.9, 24.3291796068), (26.6, 25), (26.9, 25.6708203932))
            Line((26.9, 25.6708203932), (26.9, 27.1166010489))
            ThreePointArc((26.9, 27.1166010489), (25.3, 25), (26.9, 22.8833989511))
            Line((26.9, 22.8833989511), (26.9, 24.3291796068))
        make_face()
        with BuildLine():
            ThreePointArc((26.9, 25.6708203932), (27.5, 25.9), (28.1, 25.6708203932))
            Line((28.1, 25.6708203932), (28.1, 27.1166010489))
            ThreePointArc((28.1, 27.1166010489), (27.5, 27.2), (26.9, 27.1166010489))
            Line((26.9, 27.1166010489), (26.9, 25.6708203932))
        make_face()
        with BuildLine():
            ThreePointArc((28.1, 25.6708203932), (28.3215838363, 25.3674234614), (28.4, 25))
            ThreePointArc((28.4, 25), (28.3215838363, 24.6325765386), (28.1, 24.3291796068))
            Line((28.1, 24.3291796068), (28.1, 22.8833989511))
            ThreePointArc((28.1, 22.8833989511), (29.2549928775, 23.6733500839), (29.7, 25))
            ThreePointArc((29.7, 25), (29.2549928775, 26.3266499161), (28.1, 27.1166010489))
            Line((28.1, 27.1166010489), (28.1, 25.6708203932))
        make_face()
        with BuildLine():
            Line((28.1, 22.8833989511), (28.1, 24.3291796068))
            ThreePointArc((28.1, 24.3291796068), (27.5, 24.1), (26.9, 24.3291796068))
            Line((26.9, 24.3291796068), (26.9, 22.8833989511))
            ThreePointArc((26.9, 22.8833989511), (27.5, 22.8), (28.1, 22.8833989511))
        make_face()
    extrude(amount=F2_DEPTH)


with BuildPart() as f2d:
    # F0 (on Front) → F2, piece 4 (new body)
    with BuildSketch(Plane.XZ):
        with Locations((17.5, 22)):
            Circle(F0_R)
        with Locations((17.5, 22)):
            Circle(F0_R_2, mode=Mode.SUBTRACT)
    extrude(amount=F2_DEPTH)


with BuildPart() as f2e:
    # F0 (on Front) → F2, piece 5 (new body)
    with BuildSketch(Plane.XZ):
        with BuildLine():
            ThreePointArc((8.1, 25.6708203932), (8.3215838363, 25.3674234614), (8.4, 25))
            ThreePointArc((8.4, 25), (8.3215838363, 24.6325765386), (8.1, 24.3291796068))
            Line((8.1, 24.3291796068), (8.1, 22.8833989511))
            ThreePointArc((8.1, 22.8833989511), (9.2549928775, 23.6733500839), (9.7, 25))
            ThreePointArc((9.7, 25), (9.2549928775, 26.3266499161), (8.1, 27.1166010489))
            Line((8.1, 27.1166010489), (8.1, 25.6708203932))
        make_face()
        with BuildLine():
            ThreePointArc((6.9, 25.6708203932), (7.5, 25.9), (8.1, 25.6708203932))
            Line((8.1, 25.6708203932), (8.1, 27.1166010489))
            ThreePointArc((8.1, 27.1166010489), (7.5, 27.2), (6.9, 27.1166010489))
            Line((6.9, 27.1166010489), (6.9, 25.6708203932))
        make_face()
        with BuildLine():
            Line((8.1, 22.8833989511), (8.1, 24.3291796068))
            ThreePointArc((8.1, 24.3291796068), (7.5, 24.1), (6.9, 24.3291796068))
            Line((6.9, 24.3291796068), (6.9, 22.8833989511))
            ThreePointArc((6.9, 22.8833989511), (7.5, 22.8), (8.1, 22.8833989511))
        make_face()
        with BuildLine():
            ThreePointArc((6.9, 24.3291796068), (6.6, 25), (6.9, 25.6708203932))
            Line((6.9, 25.6708203932), (6.9, 27.1166010489))
            ThreePointArc((6.9, 27.1166010489), (5.3, 25), (6.9, 22.8833989511))
            Line((6.9, 22.8833989511), (6.9, 24.3291796068))
        make_face()
    extrude(amount=F2_DEPTH)


with BuildPart() as f2f:
    # F0 (on Front) → F2, piece 6 (new body)
    with BuildSketch(Plane.XZ):
        with Locations((17.5, 4)):
            Circle(F0_R_3)
    extrude(amount=F2_DEPTH)


solid = Compound([f1.part, f1b.part, f1c.part, f1d.part, f2.part, f2b.part, f2c.part, f2d.part, f2e.part, f2f.part])
